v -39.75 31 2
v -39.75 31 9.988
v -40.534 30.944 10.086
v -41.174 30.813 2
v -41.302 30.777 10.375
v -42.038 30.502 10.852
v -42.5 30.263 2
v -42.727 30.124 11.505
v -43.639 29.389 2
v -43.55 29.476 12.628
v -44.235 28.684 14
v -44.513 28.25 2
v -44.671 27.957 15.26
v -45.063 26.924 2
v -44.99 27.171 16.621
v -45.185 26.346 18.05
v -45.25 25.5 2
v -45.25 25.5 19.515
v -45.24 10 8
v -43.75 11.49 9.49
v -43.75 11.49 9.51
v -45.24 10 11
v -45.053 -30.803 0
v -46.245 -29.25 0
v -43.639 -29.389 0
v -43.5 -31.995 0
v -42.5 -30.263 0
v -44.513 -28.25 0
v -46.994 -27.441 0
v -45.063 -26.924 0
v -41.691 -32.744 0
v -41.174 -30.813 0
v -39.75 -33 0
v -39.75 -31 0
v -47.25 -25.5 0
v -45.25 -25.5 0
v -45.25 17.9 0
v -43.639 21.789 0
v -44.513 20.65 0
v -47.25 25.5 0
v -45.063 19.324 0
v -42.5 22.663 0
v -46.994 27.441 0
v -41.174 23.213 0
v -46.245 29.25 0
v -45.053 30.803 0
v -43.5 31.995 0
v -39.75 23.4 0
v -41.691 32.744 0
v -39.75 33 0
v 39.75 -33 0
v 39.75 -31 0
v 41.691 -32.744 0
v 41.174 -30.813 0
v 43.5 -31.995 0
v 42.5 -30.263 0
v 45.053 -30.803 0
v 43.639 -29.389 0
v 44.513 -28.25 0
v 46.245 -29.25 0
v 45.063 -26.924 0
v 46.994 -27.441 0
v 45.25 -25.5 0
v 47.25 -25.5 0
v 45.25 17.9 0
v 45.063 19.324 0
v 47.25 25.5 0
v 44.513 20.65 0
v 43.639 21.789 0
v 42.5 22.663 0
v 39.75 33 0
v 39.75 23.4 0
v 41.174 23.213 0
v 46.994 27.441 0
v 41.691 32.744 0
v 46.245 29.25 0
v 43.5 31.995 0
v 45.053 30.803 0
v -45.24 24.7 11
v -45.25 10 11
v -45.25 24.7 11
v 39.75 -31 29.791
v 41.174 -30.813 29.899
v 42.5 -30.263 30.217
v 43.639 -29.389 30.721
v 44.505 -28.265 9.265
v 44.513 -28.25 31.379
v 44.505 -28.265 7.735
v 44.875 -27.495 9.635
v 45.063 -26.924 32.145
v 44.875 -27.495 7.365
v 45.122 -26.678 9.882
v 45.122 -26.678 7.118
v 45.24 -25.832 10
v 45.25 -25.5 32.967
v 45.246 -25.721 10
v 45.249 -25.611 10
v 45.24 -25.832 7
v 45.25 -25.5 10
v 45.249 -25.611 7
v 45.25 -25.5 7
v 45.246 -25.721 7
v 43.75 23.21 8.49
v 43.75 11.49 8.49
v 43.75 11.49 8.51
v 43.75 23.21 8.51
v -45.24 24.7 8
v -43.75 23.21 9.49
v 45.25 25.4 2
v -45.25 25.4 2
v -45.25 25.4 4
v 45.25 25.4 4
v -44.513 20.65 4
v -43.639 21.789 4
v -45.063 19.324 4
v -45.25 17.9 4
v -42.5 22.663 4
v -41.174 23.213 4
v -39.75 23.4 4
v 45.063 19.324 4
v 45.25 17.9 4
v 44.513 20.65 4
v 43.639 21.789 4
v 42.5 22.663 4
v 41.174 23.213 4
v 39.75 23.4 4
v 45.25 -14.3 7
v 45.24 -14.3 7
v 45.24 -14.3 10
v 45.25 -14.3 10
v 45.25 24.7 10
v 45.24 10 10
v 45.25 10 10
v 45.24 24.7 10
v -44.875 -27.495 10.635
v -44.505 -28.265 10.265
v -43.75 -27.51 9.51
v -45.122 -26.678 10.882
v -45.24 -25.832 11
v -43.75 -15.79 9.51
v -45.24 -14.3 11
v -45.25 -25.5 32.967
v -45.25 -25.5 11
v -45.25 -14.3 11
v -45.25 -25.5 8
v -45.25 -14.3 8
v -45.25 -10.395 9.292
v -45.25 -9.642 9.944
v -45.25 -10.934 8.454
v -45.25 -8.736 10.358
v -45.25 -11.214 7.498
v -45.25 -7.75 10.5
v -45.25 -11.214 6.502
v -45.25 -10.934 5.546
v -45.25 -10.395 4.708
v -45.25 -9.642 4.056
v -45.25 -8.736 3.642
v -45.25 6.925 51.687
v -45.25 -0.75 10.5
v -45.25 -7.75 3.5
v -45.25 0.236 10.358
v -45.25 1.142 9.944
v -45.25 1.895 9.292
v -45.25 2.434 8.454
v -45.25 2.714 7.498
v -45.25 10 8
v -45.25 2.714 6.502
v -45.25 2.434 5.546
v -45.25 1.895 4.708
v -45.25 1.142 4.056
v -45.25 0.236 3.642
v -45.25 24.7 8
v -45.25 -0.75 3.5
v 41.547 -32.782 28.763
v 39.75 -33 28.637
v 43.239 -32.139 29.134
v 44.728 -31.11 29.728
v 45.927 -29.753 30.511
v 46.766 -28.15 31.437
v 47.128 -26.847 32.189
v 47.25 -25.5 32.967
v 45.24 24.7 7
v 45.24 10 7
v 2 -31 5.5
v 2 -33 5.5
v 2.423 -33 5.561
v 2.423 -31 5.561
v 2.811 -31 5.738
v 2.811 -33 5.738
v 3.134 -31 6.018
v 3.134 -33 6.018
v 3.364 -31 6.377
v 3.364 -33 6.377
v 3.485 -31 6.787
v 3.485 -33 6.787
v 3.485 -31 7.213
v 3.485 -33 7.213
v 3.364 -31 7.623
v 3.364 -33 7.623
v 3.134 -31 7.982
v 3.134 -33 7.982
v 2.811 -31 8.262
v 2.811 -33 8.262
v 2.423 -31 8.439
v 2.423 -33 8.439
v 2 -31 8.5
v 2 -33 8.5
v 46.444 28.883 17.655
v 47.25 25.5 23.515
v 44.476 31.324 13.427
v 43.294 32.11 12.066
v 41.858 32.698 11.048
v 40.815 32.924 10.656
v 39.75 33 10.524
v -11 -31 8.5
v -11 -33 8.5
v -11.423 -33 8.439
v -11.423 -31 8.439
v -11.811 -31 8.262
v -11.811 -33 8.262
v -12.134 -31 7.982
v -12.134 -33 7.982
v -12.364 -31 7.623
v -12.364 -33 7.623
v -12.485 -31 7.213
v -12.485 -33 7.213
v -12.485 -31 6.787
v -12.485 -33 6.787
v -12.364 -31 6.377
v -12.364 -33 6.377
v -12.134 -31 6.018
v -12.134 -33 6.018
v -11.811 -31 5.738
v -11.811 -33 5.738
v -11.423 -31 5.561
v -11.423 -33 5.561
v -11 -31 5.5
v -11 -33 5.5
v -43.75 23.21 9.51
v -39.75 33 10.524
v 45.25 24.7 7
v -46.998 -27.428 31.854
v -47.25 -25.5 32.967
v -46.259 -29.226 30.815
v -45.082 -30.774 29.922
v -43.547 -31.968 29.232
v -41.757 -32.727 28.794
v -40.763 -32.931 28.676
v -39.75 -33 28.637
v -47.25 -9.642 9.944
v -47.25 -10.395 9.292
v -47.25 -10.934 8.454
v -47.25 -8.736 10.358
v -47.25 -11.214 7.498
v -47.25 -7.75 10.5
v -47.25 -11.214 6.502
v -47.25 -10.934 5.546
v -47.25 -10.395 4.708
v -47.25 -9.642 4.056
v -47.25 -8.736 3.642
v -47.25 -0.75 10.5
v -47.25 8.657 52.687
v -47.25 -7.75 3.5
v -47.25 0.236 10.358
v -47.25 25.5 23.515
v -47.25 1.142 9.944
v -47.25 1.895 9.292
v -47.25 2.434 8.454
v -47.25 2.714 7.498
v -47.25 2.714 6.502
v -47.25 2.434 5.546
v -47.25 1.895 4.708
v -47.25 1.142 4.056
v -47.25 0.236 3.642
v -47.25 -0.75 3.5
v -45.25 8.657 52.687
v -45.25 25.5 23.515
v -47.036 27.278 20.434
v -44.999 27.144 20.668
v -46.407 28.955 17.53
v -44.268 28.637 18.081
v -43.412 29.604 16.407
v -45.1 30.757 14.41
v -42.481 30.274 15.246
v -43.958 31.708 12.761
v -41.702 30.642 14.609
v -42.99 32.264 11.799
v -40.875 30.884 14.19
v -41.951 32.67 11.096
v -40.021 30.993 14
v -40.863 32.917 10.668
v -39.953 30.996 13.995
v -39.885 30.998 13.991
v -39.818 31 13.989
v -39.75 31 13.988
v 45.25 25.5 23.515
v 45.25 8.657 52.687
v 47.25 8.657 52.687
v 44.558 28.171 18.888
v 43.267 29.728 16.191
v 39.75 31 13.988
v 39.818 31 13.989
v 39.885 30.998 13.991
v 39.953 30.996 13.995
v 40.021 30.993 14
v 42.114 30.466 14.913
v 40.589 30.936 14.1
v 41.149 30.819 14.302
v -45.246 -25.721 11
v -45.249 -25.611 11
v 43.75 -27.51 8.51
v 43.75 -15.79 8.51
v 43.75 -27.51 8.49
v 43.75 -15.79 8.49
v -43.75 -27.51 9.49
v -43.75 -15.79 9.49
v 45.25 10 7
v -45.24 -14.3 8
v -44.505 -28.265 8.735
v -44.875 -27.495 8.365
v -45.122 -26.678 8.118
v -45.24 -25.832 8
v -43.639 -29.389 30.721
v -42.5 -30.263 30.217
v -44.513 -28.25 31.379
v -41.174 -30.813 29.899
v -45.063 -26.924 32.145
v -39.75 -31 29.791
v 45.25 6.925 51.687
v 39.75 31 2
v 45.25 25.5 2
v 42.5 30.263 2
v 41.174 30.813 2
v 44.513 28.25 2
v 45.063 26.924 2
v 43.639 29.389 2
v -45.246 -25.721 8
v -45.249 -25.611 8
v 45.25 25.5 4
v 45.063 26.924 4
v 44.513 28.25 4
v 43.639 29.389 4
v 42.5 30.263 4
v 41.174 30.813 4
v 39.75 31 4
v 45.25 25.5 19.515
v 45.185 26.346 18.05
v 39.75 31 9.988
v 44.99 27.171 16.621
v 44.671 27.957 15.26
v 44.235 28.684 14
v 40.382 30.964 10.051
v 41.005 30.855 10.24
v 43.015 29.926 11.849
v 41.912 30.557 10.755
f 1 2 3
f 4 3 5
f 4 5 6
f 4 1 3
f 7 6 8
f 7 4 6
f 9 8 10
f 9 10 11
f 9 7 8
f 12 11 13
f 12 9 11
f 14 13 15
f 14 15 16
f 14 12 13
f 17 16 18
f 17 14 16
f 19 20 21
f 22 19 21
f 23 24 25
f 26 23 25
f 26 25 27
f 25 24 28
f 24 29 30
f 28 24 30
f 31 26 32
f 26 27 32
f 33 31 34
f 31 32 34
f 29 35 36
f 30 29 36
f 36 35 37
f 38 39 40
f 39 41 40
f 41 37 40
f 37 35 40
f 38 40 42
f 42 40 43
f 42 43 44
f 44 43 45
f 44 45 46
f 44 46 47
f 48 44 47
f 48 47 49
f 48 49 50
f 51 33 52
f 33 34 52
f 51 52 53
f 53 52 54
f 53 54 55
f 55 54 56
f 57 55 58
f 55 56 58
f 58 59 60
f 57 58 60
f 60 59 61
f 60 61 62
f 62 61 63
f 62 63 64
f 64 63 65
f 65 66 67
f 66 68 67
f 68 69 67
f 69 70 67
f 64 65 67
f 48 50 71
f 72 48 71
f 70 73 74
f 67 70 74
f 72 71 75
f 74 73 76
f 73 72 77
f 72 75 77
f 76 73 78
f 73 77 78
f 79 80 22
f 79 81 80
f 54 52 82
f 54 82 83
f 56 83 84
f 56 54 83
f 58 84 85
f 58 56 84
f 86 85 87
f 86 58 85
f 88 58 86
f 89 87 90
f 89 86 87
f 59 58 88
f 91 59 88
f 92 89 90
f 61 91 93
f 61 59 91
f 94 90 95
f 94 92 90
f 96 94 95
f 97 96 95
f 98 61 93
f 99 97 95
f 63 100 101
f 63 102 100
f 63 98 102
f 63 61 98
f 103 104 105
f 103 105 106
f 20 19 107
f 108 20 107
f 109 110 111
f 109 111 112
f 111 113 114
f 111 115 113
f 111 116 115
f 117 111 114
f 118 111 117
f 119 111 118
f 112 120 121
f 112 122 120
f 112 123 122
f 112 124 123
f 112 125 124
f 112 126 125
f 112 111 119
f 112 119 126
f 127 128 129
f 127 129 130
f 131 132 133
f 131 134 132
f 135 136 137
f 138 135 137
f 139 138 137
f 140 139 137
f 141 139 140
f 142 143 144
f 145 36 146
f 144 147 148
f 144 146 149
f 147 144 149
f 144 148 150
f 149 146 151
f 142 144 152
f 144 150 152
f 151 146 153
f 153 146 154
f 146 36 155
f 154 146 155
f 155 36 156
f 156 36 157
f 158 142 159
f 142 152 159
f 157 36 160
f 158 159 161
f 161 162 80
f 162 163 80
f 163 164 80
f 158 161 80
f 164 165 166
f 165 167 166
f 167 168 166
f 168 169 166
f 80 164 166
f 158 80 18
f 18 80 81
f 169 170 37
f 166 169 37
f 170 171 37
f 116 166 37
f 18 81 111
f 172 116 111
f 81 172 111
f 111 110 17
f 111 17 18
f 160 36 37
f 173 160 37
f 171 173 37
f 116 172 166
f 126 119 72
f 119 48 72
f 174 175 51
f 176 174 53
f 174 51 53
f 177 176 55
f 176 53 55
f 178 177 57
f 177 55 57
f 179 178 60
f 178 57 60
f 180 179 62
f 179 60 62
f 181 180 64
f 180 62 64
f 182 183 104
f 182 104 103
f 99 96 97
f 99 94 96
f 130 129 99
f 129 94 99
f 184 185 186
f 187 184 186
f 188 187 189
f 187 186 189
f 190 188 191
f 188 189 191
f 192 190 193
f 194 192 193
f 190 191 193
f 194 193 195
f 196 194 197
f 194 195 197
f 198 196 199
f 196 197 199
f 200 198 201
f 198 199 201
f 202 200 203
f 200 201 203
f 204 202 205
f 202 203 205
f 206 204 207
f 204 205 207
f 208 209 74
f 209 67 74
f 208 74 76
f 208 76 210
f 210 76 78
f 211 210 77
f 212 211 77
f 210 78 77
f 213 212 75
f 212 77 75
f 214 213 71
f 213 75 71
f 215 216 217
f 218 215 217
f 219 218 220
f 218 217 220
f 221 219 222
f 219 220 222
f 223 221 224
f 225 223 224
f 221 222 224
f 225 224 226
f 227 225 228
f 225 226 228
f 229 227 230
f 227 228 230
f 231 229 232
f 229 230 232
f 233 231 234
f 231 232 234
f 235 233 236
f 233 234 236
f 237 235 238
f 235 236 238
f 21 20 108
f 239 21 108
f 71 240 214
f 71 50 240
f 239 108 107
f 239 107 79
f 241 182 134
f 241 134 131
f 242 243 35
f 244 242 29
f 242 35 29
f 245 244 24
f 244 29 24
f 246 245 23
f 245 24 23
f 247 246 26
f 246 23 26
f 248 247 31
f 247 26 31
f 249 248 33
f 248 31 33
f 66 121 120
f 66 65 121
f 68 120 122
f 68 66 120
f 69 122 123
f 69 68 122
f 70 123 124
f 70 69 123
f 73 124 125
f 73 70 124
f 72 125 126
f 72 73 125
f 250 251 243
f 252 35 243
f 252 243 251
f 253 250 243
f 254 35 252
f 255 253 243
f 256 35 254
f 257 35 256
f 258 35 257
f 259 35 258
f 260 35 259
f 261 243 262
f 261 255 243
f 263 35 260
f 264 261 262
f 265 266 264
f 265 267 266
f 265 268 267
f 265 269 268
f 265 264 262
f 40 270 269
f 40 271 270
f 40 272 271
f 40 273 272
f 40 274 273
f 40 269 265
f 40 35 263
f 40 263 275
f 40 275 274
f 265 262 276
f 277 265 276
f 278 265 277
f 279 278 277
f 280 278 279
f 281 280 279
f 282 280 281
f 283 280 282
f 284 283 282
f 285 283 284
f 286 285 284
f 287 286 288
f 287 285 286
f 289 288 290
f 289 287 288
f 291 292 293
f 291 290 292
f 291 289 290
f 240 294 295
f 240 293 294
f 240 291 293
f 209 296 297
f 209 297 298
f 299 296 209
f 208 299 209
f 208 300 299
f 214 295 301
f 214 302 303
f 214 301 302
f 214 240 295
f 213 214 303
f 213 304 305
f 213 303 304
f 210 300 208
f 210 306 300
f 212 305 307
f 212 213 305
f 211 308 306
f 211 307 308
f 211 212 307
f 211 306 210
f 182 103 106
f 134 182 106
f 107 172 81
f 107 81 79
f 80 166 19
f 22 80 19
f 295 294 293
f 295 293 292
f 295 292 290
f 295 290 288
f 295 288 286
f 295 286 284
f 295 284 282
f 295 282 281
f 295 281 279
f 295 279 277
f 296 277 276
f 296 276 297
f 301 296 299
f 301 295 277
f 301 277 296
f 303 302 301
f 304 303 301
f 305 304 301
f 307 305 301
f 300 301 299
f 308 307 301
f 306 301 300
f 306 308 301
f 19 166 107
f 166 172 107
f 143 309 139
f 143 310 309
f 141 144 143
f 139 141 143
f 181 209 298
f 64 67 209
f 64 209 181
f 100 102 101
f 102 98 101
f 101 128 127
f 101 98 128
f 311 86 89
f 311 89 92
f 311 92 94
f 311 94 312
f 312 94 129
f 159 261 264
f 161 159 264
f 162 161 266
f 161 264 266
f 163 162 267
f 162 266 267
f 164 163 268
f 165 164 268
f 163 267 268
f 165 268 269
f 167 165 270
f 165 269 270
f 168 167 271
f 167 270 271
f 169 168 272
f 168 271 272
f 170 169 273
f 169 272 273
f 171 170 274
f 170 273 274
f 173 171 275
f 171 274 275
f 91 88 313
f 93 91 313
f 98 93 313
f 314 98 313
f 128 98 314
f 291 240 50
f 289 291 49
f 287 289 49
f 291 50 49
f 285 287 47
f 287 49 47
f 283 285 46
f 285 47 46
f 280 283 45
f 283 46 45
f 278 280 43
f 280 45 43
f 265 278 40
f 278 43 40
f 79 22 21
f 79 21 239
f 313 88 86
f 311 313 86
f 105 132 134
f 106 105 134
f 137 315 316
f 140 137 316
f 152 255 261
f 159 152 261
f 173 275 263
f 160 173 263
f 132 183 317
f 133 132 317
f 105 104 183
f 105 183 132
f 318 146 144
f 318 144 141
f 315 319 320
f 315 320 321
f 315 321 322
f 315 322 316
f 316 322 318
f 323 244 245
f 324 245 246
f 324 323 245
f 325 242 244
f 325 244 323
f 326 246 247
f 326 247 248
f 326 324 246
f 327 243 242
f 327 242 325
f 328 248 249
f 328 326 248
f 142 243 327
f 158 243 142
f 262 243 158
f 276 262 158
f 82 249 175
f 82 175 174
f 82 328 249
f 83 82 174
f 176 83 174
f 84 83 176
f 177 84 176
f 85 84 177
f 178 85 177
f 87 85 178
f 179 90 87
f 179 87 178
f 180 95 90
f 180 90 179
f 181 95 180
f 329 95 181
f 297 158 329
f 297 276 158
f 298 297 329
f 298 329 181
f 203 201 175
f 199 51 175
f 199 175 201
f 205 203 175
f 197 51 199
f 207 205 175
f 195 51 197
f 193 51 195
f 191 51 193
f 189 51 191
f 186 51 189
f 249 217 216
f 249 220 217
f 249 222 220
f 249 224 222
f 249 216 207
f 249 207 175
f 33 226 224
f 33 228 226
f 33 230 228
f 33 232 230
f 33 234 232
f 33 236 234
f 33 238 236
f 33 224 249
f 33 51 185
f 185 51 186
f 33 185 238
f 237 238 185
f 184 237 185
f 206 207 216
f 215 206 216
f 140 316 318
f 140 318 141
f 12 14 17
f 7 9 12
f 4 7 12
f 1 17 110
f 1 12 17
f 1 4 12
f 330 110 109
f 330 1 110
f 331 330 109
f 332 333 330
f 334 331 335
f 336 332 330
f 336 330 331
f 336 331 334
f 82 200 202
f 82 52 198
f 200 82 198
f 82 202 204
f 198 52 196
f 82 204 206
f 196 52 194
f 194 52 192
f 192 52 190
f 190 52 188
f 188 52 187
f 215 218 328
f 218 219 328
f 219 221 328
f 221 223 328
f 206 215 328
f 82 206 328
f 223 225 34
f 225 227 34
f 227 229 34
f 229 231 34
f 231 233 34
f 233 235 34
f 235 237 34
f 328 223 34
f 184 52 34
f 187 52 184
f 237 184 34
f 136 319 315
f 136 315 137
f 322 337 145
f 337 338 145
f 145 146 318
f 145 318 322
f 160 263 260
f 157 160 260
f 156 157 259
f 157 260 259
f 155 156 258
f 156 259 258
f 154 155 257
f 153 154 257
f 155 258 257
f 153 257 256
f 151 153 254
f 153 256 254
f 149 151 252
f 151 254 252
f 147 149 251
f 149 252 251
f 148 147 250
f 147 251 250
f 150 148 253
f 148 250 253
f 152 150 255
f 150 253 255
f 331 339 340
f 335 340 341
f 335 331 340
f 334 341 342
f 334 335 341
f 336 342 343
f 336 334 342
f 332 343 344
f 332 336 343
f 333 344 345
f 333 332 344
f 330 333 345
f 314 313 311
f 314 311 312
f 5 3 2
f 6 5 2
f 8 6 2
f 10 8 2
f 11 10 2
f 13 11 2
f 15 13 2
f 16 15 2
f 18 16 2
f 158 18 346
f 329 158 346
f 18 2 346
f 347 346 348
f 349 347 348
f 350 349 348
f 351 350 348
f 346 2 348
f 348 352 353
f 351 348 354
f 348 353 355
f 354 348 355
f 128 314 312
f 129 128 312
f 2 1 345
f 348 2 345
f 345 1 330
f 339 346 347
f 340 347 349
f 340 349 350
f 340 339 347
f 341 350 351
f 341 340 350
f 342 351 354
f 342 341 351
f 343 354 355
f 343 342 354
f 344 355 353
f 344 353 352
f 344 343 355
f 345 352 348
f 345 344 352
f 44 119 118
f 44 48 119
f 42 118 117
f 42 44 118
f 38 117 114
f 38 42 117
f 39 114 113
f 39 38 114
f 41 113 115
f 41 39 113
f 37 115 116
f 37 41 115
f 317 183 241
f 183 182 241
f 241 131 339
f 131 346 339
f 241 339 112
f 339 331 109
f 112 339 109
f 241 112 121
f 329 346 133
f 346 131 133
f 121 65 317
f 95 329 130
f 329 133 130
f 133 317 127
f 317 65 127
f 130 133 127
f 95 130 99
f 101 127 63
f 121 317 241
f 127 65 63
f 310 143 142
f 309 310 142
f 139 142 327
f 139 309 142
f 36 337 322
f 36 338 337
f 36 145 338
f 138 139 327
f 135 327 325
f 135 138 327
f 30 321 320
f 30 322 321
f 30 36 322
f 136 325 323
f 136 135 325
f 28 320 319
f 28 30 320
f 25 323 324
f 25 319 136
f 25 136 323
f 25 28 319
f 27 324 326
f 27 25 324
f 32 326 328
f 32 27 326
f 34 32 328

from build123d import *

# Parameters (mm, degrees)
BOX004_W               = 1.5
BOX004_H               = 14.7
BOX004_DEPTH           = 3
CHAMFER001_SIZE        = 1.49
BOX005_W               = 1.5
BOX005_H               = 14.7
BOX005_DEPTH           = 3
CHAMFER002_SIZE        = 1.49
BOX006_W               = 1.5
BOX006_H               = 14.7
BOX006_DEPTH           = 3
CHAMFER003_SIZE        = 1.49
EXTRUDE006_DEPTH       = 3
EXTRUDE005_DEPTH       = 3
BOX001_W               = 100
BOX001_H               = 100
BOX001_DEPTH           = 100
BOX001_PLACEMENT_ANGLE = 30
BOX_W                  = 100
BOX_H                  = 100
BOX_DEPTH              = 100
BOX_PLACEMENT_ANGLE    = 30
EXTRUDE_DEPTH          = 2
EXTRUDE001_DEPTH       = 2
EXTRUDE002_DEPTH       = 10
EXTRUDE003_DEPTH       = 52
EXTRUDE004_DEPTH       = 56
BOX002_W               = 100
BOX002_H               = 2
BOX002_DEPTH           = 100
BOX002_PLACEMENT_ANGLE = 30
BOX003_W               = 1.5
BOX003_H               = 14.7
BOX003_DEPTH           = 3
CHAMFER_SIZE           = 1.49


with BuildPart() as chamfer001:
    # Box004 → Box004 (new body)
    with BuildSketch(Plane(origin=(-45.25, -29, 8), x_dir=(1, 0, 0), z_dir=(0, 0, 1))):
        with Locations((0.75, 7.35)):
            Rectangle(BOX004_W, BOX004_H)
    extrude(amount=BOX004_DEPTH)

    # Chamfer001
    chamfer001_edges = [chamfer001.edges().sort_by_distance(p)[0] for p in [
        (-43.75, -29, 9.5),
        (-43.75, -21.65, 11),
        (-43.75, -14.3, 9.5),
        (-43.75, -21.65, 8),
    ]]
    chamfer(chamfer001_edges, length=CHAMFER001_SIZE)


with BuildPart() as chamfer002:
    # Box005 → Box005 (new body)
    with BuildSketch(Plane(origin=(43.75, 10, 7), x_dir=(1, 0, 0), z_dir=(0, 0, 1))):
        with Locations((0.75, 7.35)):
            Rectangle(BOX005_W, BOX005_H)
    extrude(amount=BOX005_DEPTH)

    # Chamfer002
    chamfer002_edges = [chamfer002.edges().sort_by_distance(p)[0] for p in [
        (43.75, 10, 8.5),
        (43.75, 17.35, 10),
        (43.75, 24.7, 8.5),
        (43.75, 17.35, 7),
    ]]
    chamfer(chamfer002_edges, length=CHAMFER002_SIZE)


with BuildPart() as chamfer003:
    # Box006 → Box006 (new body)
    with BuildSketch(Plane(origin=(-45.25, 10, 8), x_dir=(1, 0, 0), z_dir=(0, 0, 1))):
        with Locations((0.75, 7.35)):
            Rectangle(BOX006_W, BOX006_H)
    extrude(amount=BOX006_DEPTH)

    # Chamfer003
    chamfer003_edges = [chamfer003.edges().sort_by_distance(p)[0] for p in [
        (-43.75, 10, 9.5),
        (-43.75, 17.35, 11),
        (-43.75, 24.7, 9.5),
        (-43.75, 17.35, 8),
    ]]
    chamfer(chamfer003_edges, length=CHAMFER003_SIZE)


with BuildPart() as extrude006:
    # Sketch007 (on Face25 of Cut001) → Extrude006 (new body)
    with BuildSketch(Plane(origin=(-47.25, 0, 0), x_dir=(0, -1, 0), z_dir=(-1, 0, 0))):
        with BuildLine():
            ThreePointArc((0.75, 10.5), (-2.75, 7), (0.75, 3.5))
            Line((0.75, 3.5), (7.75, 3.5))
            ThreePointArc((7.75, 3.5), (11.25, 7), (7.75, 10.5))
            Line((7.75, 10.5), (0.75, 10.5))
        make_face()
    extrude(amount=-EXTRUDE006_DEPTH)


with BuildPart() as extrude005:
    # Sketch006 (on Face43 of Cut001) → Extrude005 (new body)
    with BuildSketch(Plane.XZ.offset(33)):
        with BuildLine():
            ThreePointArc((2, 5.5), (3.5, 7), (2, 8.5))
            Line((2, 8.5), (-11, 8.5))
            ThreePointArc((-11, 8.5), (-12.5, 7), (-11, 5.5))
            Line((-11, 5.5), (2, 5.5))
        make_face()
    extrude(amount=-EXTRUDE005_DEPTH)


with BuildPart() as cube001:
    # Box001 → Box001 (new body)
    with BuildSketch(Plane.XY):
        with Locations((50, 50)):
            Rectangle(BOX001_W, BOX001_H)
    extrude(amount=BOX001_DEPTH)


with BuildPart() as cube001_1:
    # Box001 placement: moved
    add(cube001.part.moved(Location((-50, -49.539727, 19.087357))).rotate(Axis((-50, -49.539727, 19.087357), (1, 0, 0)), BOX001_PLACEMENT_ANGLE))


with BuildPart() as cube:
    # Box → Box (new body)
    with BuildSketch(Plane.XY):
        with Locations((50, 50)):
            Rectangle(BOX_W, BOX_H)
    extrude(amount=BOX_DEPTH)


with BuildPart() as cube_1:
    # Box placement: moved
    add(cube.part.moved(Location((-50, 39.30718, -0.4))).rotate(Axis((-50, 39.30718, -0.4), (1, 0, 0)), BOX_PLACEMENT_ANGLE))


with BuildPart() as extrude_body:
    # Sketch001 → Extrude (new body)
    with BuildSketch(Plane.XY):
        with BuildLine():
            ThreePointArc((-39.75, 33), (-45.053301, 30.803301), (-47.25, 25.5))
            Line((-47.25, -25.5), (-47.25, 25.5))
            ThreePointArc((-47.25, -25.5), (-45.053301, -30.803301), (-39.75, -33))
            Line((39.75, -33), (-39.75, -33))
            ThreePointArc((39.75, -33), (45.053301, -30.803301), (47.25, -25.5))
            Line((47.25, 25.5), (47.25, -25.5))
            ThreePointArc((47.25, 25.5), (45.053301, 30.803301), (39.75, 33))
            Line((-39.75, 33), (39.75, 33))
        make_face()
        with BuildLine():
            ThreePointArc((-39.75, 23.4), (-43.639087, 21.789087), (-45.25, 17.9))
            Line((-45.25, -25.5), (-45.25, 17.9))
            ThreePointArc((-45.25, -25.5), (-43.639087, -29.389087), (-39.75, -31))
            Line((39.75, -31), (-39.75, -31))
            ThreePointArc((39.75, -31), (43.639087, -29.389087), (45.25, -25.5))
            Line((45.25, 17.9), (45.25, -25.5))
            ThreePointArc((45.25, 17.9), (43.639087, 21.789087), (39.75, 23.4))
            Line((-39.75, 23.4), (39.75, 23.4))
        make_face(mode=Mode.SUBTRACT)
    extrude(amount=EXTRUDE_DEPTH)


with BuildPart() as extrude_2mm:
    # Sketch002 → Extrude001 (new body)
    with BuildSketch(Plane.XY.offset(2)):
        with BuildLine():
            ThreePointArc((-39.75, 33), (-45.053301, 30.803301), (-47.25, 25.5))
            Line((-47.25, -25.5), (-47.25, 25.5))
            ThreePointArc((-47.25, -25.5), (-45.053301, -30.803301), (-39.75, -33))
            Line((39.75, -33), (-39.75, -33))
            ThreePointArc((39.75, -33), (45.053301, -30.803301), (47.25, -25.5))
            Line((47.25, 25.5), (47.25, -25.5))
            ThreePointArc((47.25, 25.5), (45.053301, 30.803301), (39.75, 33))
            Line((-39.75, 33), (39.75, 33))
        make_face()
        with BuildLine():
            ThreePointArc((-39.75, 23.4), (-43.639087, 21.789087), (-45.25, 17.9))
            Line((-45.25, -25.5), (-45.25, 17.9))
            ThreePointArc((-45.25, -25.5), (-43.639087, -29.389087), (-39.75, -31))
            Line((39.75, -31), (-39.75, -31))
            ThreePointArc((39.75, -31), (43.639087, -29.389087), (45.25, -25.5))
            Line((45.25, 17.9), (45.25, -25.5))
            ThreePointArc((45.25, 17.9), (43.639087, 21.789087), (39.75, 23.4))
            Line((-39.75, 23.4), (39.75, 23.4))
        make_face(mode=Mode.SUBTRACT)
        with BuildLine():
            ThreePointArc((-39.75, 31), (-43.639087, 29.389087), (-45.25, 25.5))
            Line((-45.25, 25.5), (-45.25, 25.4))
            Line((-45.25, 25.4), (45.25, 25.4))
            Line((45.25, 25.5), (45.25, 25.4))
            ThreePointArc((45.25, 25.5), (43.639086, 29.389089), (39.749996, 31))
            Line((-39.75, 31), (39.749996, 31))
        make_face(mode=Mode.SUBTRACT)
    extrude(amount=EXTRUDE001_DEPTH)


with BuildPart() as extrude_4mm:
    # Sketch003 → Extrude002 (new body)
    with BuildSketch(Plane.XY.offset(4)):
        with BuildLine():
            ThreePointArc((-39.75, 33), (-45.053301, 30.803301), (-47.25, 25.5))
            Line((-47.25, -25.5), (-47.25, 25.5))
            ThreePointArc((-47.25, -25.5), (-45.053301, -30.803301), (-39.75, -33))
            Line((39.75, -33), (-39.75, -33))
            ThreePointArc((39.75, -33), (45.053301, -30.803301), (47.25, -25.5))
            Line((47.25, 25.5), (47.25, -25.5))
            ThreePointArc((47.25, 25.5), (45.053301, 30.803301), (39.75, 33))
            Line((-39.75, 33), (39.75, 33))
        make_face()
        with BuildLine():
            ThreePointArc((-39.75, 31), (-43.639087, 29.389087), (-45.25, 25.5))
            Line((-45.25, -25.5), (-45.25, 25.5))
            ThreePointArc((-45.25, -25.5), (-43.639087, -29.389087), (-39.75, -31))
            Line((39.75, -31), (-39.75, -31))
            ThreePointArc((39.75, -31), (43.639087, -29.389087), (45.25, -25.5))
            Line((45.25, 25.5), (45.25, -25.5))
            ThreePointArc((45.25, 25.5), (43.639087, 29.389087), (39.75, 31))
            Line((-39.75, 31), (39.75, 31))
        make_face(mode=Mode.SUBTRACT)
    extrude(amount=EXTRUDE002_DEPTH)


with BuildPart() as extrude_6mm:
    # Sketch003 → Extrude003 (new body)
    with BuildSketch(Plane.XY.offset(4)):
        with BuildLine():
            ThreePointArc((-39.75, 33), (-45.053301, 30.803301), (-47.25, 25.5))
            Line((-47.25, -25.5), (-47.25, 25.5))
            ThreePointArc((-47.25, -25.5), (-45.053301, -30.803301), (-39.75, -33))
            Line((39.75, -33), (-39.75, -33))
            ThreePointArc((39.75, -33), (45.053301, -30.803301), (47.25, -25.5))
            Line((47.25, 25.5), (47.25, -25.5))
            ThreePointArc((47.25, 25.5), (45.053301, 30.803301), (39.75, 33))
            Line((-39.75, 33), (39.75, 33))
        make_face()
        with BuildLine():
            ThreePointArc((-39.75, 31), (-43.639087, 29.389087), (-45.25, 25.5))
            Line((-45.25, -25.5), (-45.25, 25.5))
            ThreePointArc((-45.25, -25.5), (-43.639087, -29.389087), (-39.75, -31))
            Line((39.75, -31), (-39.75, -31))
            ThreePointArc((39.75, -31), (43.639087, -29.389087), (45.25, -25.5))
            Line((45.25, 25.5), (45.25, -25.5))
            ThreePointArc((45.25, 25.5), (43.639087, 29.389087), (39.75, 31))
            Line((-39.75, 31), (39.75, 31))
        make_face(mode=Mode.SUBTRACT)
    extrude(amount=EXTRUDE003_DEPTH)


with BuildPart() as extrude004:
    # Sketch004 → Extrude004 (new body)
    with BuildSketch(Plane.XY):
        with BuildLine():
            ThreePointArc((-39.75, 33), (-45.053301, 30.803301), (-47.25, 25.5))
            Line((-47.25, -25.5), (-47.25, 25.5))
            ThreePointArc((-47.25, -25.5), (-45.053301, -30.803301), (-39.75, -33))
            Line((39.75, -33), (-39.75, -33))
            ThreePointArc((39.75, -33), (45.053301, -30.803301), (47.25, -25.5))
            Line((47.25, 25.5), (47.25, -25.5))
            ThreePointArc((47.25, 25.5), (45.053301, 30.803301), (39.75, 33))
            Line((-39.75, 33), (39.75, 33))
        make_face()
    extrude(amount=EXTRUDE004_DEPTH)


with BuildPart() as cut003:
    # Box002 → Box002 (new body)
    with BuildSketch(Plane.XY):
        with Locations((50, 1)):
            Rectangle(BOX002_W, BOX002_H)
    extrude(amount=BOX002_DEPTH)


with BuildPart() as cut003_1:
    # Box002 placement: moved
    add(cut003.part.moved(Location((-50, 37.575129, -1.4))).rotate(Axis((-50, 37.575129, -1.4), (1, 0, 0)), BOX002_PLACEMENT_ANGLE))

    # Common: intersect Extrude004
    add(extrude004.part, mode=Mode.INTERSECT)

    # Fusion: union Extrude body, Extrude_2mm, Extrude_4mm, Extrude_6mm
    add(extrude_body.part)
    add(extrude_2mm.part)
    add(extrude_4mm.part)
    add(extrude_6mm.part)

    # Cut: cut Cube
    add(cube_1.part, mode=Mode.SUBTRACT)

    # Cut001: cut Cube001
    add(cube001_1.part, mode=Mode.SUBTRACT)

    # Cut002: cut Extrude005
    add(extrude005.part, mode=Mode.SUBTRACT)

    # Cut003: cut Extrude006
    add(extrude006.part, mode=Mode.SUBTRACT)


with BuildPart() as main:
    # Box003 → Box003 (new body)
    with BuildSketch(Plane(origin=(43.75, -29, 7), x_dir=(1, 0, 0), z_dir=(0, 0, 1))):
        with Locations((0.75, 7.35)):
            Rectangle(BOX003_W, BOX003_H)
    extrude(amount=BOX003_DEPTH)

    # Chamfer
    chamfer_edges = [main.edges().sort_by_distance(p)[0] for p in [
        (43.75, -29, 8.5),
        (43.75, -21.65, 10),
        (43.75, -14.3, 8.5),
        (43.75, -21.65, 7),
    ]]
    chamfer(chamfer_edges, length=CHAMFER_SIZE)

    # Connect: union Chamfer001, Chamfer002, Chamfer003, Cut003
    add(chamfer001.part)
    add(chamfer002.part)
    add(chamfer003.part)
    add(cut003_1.part)


solid = main.part
